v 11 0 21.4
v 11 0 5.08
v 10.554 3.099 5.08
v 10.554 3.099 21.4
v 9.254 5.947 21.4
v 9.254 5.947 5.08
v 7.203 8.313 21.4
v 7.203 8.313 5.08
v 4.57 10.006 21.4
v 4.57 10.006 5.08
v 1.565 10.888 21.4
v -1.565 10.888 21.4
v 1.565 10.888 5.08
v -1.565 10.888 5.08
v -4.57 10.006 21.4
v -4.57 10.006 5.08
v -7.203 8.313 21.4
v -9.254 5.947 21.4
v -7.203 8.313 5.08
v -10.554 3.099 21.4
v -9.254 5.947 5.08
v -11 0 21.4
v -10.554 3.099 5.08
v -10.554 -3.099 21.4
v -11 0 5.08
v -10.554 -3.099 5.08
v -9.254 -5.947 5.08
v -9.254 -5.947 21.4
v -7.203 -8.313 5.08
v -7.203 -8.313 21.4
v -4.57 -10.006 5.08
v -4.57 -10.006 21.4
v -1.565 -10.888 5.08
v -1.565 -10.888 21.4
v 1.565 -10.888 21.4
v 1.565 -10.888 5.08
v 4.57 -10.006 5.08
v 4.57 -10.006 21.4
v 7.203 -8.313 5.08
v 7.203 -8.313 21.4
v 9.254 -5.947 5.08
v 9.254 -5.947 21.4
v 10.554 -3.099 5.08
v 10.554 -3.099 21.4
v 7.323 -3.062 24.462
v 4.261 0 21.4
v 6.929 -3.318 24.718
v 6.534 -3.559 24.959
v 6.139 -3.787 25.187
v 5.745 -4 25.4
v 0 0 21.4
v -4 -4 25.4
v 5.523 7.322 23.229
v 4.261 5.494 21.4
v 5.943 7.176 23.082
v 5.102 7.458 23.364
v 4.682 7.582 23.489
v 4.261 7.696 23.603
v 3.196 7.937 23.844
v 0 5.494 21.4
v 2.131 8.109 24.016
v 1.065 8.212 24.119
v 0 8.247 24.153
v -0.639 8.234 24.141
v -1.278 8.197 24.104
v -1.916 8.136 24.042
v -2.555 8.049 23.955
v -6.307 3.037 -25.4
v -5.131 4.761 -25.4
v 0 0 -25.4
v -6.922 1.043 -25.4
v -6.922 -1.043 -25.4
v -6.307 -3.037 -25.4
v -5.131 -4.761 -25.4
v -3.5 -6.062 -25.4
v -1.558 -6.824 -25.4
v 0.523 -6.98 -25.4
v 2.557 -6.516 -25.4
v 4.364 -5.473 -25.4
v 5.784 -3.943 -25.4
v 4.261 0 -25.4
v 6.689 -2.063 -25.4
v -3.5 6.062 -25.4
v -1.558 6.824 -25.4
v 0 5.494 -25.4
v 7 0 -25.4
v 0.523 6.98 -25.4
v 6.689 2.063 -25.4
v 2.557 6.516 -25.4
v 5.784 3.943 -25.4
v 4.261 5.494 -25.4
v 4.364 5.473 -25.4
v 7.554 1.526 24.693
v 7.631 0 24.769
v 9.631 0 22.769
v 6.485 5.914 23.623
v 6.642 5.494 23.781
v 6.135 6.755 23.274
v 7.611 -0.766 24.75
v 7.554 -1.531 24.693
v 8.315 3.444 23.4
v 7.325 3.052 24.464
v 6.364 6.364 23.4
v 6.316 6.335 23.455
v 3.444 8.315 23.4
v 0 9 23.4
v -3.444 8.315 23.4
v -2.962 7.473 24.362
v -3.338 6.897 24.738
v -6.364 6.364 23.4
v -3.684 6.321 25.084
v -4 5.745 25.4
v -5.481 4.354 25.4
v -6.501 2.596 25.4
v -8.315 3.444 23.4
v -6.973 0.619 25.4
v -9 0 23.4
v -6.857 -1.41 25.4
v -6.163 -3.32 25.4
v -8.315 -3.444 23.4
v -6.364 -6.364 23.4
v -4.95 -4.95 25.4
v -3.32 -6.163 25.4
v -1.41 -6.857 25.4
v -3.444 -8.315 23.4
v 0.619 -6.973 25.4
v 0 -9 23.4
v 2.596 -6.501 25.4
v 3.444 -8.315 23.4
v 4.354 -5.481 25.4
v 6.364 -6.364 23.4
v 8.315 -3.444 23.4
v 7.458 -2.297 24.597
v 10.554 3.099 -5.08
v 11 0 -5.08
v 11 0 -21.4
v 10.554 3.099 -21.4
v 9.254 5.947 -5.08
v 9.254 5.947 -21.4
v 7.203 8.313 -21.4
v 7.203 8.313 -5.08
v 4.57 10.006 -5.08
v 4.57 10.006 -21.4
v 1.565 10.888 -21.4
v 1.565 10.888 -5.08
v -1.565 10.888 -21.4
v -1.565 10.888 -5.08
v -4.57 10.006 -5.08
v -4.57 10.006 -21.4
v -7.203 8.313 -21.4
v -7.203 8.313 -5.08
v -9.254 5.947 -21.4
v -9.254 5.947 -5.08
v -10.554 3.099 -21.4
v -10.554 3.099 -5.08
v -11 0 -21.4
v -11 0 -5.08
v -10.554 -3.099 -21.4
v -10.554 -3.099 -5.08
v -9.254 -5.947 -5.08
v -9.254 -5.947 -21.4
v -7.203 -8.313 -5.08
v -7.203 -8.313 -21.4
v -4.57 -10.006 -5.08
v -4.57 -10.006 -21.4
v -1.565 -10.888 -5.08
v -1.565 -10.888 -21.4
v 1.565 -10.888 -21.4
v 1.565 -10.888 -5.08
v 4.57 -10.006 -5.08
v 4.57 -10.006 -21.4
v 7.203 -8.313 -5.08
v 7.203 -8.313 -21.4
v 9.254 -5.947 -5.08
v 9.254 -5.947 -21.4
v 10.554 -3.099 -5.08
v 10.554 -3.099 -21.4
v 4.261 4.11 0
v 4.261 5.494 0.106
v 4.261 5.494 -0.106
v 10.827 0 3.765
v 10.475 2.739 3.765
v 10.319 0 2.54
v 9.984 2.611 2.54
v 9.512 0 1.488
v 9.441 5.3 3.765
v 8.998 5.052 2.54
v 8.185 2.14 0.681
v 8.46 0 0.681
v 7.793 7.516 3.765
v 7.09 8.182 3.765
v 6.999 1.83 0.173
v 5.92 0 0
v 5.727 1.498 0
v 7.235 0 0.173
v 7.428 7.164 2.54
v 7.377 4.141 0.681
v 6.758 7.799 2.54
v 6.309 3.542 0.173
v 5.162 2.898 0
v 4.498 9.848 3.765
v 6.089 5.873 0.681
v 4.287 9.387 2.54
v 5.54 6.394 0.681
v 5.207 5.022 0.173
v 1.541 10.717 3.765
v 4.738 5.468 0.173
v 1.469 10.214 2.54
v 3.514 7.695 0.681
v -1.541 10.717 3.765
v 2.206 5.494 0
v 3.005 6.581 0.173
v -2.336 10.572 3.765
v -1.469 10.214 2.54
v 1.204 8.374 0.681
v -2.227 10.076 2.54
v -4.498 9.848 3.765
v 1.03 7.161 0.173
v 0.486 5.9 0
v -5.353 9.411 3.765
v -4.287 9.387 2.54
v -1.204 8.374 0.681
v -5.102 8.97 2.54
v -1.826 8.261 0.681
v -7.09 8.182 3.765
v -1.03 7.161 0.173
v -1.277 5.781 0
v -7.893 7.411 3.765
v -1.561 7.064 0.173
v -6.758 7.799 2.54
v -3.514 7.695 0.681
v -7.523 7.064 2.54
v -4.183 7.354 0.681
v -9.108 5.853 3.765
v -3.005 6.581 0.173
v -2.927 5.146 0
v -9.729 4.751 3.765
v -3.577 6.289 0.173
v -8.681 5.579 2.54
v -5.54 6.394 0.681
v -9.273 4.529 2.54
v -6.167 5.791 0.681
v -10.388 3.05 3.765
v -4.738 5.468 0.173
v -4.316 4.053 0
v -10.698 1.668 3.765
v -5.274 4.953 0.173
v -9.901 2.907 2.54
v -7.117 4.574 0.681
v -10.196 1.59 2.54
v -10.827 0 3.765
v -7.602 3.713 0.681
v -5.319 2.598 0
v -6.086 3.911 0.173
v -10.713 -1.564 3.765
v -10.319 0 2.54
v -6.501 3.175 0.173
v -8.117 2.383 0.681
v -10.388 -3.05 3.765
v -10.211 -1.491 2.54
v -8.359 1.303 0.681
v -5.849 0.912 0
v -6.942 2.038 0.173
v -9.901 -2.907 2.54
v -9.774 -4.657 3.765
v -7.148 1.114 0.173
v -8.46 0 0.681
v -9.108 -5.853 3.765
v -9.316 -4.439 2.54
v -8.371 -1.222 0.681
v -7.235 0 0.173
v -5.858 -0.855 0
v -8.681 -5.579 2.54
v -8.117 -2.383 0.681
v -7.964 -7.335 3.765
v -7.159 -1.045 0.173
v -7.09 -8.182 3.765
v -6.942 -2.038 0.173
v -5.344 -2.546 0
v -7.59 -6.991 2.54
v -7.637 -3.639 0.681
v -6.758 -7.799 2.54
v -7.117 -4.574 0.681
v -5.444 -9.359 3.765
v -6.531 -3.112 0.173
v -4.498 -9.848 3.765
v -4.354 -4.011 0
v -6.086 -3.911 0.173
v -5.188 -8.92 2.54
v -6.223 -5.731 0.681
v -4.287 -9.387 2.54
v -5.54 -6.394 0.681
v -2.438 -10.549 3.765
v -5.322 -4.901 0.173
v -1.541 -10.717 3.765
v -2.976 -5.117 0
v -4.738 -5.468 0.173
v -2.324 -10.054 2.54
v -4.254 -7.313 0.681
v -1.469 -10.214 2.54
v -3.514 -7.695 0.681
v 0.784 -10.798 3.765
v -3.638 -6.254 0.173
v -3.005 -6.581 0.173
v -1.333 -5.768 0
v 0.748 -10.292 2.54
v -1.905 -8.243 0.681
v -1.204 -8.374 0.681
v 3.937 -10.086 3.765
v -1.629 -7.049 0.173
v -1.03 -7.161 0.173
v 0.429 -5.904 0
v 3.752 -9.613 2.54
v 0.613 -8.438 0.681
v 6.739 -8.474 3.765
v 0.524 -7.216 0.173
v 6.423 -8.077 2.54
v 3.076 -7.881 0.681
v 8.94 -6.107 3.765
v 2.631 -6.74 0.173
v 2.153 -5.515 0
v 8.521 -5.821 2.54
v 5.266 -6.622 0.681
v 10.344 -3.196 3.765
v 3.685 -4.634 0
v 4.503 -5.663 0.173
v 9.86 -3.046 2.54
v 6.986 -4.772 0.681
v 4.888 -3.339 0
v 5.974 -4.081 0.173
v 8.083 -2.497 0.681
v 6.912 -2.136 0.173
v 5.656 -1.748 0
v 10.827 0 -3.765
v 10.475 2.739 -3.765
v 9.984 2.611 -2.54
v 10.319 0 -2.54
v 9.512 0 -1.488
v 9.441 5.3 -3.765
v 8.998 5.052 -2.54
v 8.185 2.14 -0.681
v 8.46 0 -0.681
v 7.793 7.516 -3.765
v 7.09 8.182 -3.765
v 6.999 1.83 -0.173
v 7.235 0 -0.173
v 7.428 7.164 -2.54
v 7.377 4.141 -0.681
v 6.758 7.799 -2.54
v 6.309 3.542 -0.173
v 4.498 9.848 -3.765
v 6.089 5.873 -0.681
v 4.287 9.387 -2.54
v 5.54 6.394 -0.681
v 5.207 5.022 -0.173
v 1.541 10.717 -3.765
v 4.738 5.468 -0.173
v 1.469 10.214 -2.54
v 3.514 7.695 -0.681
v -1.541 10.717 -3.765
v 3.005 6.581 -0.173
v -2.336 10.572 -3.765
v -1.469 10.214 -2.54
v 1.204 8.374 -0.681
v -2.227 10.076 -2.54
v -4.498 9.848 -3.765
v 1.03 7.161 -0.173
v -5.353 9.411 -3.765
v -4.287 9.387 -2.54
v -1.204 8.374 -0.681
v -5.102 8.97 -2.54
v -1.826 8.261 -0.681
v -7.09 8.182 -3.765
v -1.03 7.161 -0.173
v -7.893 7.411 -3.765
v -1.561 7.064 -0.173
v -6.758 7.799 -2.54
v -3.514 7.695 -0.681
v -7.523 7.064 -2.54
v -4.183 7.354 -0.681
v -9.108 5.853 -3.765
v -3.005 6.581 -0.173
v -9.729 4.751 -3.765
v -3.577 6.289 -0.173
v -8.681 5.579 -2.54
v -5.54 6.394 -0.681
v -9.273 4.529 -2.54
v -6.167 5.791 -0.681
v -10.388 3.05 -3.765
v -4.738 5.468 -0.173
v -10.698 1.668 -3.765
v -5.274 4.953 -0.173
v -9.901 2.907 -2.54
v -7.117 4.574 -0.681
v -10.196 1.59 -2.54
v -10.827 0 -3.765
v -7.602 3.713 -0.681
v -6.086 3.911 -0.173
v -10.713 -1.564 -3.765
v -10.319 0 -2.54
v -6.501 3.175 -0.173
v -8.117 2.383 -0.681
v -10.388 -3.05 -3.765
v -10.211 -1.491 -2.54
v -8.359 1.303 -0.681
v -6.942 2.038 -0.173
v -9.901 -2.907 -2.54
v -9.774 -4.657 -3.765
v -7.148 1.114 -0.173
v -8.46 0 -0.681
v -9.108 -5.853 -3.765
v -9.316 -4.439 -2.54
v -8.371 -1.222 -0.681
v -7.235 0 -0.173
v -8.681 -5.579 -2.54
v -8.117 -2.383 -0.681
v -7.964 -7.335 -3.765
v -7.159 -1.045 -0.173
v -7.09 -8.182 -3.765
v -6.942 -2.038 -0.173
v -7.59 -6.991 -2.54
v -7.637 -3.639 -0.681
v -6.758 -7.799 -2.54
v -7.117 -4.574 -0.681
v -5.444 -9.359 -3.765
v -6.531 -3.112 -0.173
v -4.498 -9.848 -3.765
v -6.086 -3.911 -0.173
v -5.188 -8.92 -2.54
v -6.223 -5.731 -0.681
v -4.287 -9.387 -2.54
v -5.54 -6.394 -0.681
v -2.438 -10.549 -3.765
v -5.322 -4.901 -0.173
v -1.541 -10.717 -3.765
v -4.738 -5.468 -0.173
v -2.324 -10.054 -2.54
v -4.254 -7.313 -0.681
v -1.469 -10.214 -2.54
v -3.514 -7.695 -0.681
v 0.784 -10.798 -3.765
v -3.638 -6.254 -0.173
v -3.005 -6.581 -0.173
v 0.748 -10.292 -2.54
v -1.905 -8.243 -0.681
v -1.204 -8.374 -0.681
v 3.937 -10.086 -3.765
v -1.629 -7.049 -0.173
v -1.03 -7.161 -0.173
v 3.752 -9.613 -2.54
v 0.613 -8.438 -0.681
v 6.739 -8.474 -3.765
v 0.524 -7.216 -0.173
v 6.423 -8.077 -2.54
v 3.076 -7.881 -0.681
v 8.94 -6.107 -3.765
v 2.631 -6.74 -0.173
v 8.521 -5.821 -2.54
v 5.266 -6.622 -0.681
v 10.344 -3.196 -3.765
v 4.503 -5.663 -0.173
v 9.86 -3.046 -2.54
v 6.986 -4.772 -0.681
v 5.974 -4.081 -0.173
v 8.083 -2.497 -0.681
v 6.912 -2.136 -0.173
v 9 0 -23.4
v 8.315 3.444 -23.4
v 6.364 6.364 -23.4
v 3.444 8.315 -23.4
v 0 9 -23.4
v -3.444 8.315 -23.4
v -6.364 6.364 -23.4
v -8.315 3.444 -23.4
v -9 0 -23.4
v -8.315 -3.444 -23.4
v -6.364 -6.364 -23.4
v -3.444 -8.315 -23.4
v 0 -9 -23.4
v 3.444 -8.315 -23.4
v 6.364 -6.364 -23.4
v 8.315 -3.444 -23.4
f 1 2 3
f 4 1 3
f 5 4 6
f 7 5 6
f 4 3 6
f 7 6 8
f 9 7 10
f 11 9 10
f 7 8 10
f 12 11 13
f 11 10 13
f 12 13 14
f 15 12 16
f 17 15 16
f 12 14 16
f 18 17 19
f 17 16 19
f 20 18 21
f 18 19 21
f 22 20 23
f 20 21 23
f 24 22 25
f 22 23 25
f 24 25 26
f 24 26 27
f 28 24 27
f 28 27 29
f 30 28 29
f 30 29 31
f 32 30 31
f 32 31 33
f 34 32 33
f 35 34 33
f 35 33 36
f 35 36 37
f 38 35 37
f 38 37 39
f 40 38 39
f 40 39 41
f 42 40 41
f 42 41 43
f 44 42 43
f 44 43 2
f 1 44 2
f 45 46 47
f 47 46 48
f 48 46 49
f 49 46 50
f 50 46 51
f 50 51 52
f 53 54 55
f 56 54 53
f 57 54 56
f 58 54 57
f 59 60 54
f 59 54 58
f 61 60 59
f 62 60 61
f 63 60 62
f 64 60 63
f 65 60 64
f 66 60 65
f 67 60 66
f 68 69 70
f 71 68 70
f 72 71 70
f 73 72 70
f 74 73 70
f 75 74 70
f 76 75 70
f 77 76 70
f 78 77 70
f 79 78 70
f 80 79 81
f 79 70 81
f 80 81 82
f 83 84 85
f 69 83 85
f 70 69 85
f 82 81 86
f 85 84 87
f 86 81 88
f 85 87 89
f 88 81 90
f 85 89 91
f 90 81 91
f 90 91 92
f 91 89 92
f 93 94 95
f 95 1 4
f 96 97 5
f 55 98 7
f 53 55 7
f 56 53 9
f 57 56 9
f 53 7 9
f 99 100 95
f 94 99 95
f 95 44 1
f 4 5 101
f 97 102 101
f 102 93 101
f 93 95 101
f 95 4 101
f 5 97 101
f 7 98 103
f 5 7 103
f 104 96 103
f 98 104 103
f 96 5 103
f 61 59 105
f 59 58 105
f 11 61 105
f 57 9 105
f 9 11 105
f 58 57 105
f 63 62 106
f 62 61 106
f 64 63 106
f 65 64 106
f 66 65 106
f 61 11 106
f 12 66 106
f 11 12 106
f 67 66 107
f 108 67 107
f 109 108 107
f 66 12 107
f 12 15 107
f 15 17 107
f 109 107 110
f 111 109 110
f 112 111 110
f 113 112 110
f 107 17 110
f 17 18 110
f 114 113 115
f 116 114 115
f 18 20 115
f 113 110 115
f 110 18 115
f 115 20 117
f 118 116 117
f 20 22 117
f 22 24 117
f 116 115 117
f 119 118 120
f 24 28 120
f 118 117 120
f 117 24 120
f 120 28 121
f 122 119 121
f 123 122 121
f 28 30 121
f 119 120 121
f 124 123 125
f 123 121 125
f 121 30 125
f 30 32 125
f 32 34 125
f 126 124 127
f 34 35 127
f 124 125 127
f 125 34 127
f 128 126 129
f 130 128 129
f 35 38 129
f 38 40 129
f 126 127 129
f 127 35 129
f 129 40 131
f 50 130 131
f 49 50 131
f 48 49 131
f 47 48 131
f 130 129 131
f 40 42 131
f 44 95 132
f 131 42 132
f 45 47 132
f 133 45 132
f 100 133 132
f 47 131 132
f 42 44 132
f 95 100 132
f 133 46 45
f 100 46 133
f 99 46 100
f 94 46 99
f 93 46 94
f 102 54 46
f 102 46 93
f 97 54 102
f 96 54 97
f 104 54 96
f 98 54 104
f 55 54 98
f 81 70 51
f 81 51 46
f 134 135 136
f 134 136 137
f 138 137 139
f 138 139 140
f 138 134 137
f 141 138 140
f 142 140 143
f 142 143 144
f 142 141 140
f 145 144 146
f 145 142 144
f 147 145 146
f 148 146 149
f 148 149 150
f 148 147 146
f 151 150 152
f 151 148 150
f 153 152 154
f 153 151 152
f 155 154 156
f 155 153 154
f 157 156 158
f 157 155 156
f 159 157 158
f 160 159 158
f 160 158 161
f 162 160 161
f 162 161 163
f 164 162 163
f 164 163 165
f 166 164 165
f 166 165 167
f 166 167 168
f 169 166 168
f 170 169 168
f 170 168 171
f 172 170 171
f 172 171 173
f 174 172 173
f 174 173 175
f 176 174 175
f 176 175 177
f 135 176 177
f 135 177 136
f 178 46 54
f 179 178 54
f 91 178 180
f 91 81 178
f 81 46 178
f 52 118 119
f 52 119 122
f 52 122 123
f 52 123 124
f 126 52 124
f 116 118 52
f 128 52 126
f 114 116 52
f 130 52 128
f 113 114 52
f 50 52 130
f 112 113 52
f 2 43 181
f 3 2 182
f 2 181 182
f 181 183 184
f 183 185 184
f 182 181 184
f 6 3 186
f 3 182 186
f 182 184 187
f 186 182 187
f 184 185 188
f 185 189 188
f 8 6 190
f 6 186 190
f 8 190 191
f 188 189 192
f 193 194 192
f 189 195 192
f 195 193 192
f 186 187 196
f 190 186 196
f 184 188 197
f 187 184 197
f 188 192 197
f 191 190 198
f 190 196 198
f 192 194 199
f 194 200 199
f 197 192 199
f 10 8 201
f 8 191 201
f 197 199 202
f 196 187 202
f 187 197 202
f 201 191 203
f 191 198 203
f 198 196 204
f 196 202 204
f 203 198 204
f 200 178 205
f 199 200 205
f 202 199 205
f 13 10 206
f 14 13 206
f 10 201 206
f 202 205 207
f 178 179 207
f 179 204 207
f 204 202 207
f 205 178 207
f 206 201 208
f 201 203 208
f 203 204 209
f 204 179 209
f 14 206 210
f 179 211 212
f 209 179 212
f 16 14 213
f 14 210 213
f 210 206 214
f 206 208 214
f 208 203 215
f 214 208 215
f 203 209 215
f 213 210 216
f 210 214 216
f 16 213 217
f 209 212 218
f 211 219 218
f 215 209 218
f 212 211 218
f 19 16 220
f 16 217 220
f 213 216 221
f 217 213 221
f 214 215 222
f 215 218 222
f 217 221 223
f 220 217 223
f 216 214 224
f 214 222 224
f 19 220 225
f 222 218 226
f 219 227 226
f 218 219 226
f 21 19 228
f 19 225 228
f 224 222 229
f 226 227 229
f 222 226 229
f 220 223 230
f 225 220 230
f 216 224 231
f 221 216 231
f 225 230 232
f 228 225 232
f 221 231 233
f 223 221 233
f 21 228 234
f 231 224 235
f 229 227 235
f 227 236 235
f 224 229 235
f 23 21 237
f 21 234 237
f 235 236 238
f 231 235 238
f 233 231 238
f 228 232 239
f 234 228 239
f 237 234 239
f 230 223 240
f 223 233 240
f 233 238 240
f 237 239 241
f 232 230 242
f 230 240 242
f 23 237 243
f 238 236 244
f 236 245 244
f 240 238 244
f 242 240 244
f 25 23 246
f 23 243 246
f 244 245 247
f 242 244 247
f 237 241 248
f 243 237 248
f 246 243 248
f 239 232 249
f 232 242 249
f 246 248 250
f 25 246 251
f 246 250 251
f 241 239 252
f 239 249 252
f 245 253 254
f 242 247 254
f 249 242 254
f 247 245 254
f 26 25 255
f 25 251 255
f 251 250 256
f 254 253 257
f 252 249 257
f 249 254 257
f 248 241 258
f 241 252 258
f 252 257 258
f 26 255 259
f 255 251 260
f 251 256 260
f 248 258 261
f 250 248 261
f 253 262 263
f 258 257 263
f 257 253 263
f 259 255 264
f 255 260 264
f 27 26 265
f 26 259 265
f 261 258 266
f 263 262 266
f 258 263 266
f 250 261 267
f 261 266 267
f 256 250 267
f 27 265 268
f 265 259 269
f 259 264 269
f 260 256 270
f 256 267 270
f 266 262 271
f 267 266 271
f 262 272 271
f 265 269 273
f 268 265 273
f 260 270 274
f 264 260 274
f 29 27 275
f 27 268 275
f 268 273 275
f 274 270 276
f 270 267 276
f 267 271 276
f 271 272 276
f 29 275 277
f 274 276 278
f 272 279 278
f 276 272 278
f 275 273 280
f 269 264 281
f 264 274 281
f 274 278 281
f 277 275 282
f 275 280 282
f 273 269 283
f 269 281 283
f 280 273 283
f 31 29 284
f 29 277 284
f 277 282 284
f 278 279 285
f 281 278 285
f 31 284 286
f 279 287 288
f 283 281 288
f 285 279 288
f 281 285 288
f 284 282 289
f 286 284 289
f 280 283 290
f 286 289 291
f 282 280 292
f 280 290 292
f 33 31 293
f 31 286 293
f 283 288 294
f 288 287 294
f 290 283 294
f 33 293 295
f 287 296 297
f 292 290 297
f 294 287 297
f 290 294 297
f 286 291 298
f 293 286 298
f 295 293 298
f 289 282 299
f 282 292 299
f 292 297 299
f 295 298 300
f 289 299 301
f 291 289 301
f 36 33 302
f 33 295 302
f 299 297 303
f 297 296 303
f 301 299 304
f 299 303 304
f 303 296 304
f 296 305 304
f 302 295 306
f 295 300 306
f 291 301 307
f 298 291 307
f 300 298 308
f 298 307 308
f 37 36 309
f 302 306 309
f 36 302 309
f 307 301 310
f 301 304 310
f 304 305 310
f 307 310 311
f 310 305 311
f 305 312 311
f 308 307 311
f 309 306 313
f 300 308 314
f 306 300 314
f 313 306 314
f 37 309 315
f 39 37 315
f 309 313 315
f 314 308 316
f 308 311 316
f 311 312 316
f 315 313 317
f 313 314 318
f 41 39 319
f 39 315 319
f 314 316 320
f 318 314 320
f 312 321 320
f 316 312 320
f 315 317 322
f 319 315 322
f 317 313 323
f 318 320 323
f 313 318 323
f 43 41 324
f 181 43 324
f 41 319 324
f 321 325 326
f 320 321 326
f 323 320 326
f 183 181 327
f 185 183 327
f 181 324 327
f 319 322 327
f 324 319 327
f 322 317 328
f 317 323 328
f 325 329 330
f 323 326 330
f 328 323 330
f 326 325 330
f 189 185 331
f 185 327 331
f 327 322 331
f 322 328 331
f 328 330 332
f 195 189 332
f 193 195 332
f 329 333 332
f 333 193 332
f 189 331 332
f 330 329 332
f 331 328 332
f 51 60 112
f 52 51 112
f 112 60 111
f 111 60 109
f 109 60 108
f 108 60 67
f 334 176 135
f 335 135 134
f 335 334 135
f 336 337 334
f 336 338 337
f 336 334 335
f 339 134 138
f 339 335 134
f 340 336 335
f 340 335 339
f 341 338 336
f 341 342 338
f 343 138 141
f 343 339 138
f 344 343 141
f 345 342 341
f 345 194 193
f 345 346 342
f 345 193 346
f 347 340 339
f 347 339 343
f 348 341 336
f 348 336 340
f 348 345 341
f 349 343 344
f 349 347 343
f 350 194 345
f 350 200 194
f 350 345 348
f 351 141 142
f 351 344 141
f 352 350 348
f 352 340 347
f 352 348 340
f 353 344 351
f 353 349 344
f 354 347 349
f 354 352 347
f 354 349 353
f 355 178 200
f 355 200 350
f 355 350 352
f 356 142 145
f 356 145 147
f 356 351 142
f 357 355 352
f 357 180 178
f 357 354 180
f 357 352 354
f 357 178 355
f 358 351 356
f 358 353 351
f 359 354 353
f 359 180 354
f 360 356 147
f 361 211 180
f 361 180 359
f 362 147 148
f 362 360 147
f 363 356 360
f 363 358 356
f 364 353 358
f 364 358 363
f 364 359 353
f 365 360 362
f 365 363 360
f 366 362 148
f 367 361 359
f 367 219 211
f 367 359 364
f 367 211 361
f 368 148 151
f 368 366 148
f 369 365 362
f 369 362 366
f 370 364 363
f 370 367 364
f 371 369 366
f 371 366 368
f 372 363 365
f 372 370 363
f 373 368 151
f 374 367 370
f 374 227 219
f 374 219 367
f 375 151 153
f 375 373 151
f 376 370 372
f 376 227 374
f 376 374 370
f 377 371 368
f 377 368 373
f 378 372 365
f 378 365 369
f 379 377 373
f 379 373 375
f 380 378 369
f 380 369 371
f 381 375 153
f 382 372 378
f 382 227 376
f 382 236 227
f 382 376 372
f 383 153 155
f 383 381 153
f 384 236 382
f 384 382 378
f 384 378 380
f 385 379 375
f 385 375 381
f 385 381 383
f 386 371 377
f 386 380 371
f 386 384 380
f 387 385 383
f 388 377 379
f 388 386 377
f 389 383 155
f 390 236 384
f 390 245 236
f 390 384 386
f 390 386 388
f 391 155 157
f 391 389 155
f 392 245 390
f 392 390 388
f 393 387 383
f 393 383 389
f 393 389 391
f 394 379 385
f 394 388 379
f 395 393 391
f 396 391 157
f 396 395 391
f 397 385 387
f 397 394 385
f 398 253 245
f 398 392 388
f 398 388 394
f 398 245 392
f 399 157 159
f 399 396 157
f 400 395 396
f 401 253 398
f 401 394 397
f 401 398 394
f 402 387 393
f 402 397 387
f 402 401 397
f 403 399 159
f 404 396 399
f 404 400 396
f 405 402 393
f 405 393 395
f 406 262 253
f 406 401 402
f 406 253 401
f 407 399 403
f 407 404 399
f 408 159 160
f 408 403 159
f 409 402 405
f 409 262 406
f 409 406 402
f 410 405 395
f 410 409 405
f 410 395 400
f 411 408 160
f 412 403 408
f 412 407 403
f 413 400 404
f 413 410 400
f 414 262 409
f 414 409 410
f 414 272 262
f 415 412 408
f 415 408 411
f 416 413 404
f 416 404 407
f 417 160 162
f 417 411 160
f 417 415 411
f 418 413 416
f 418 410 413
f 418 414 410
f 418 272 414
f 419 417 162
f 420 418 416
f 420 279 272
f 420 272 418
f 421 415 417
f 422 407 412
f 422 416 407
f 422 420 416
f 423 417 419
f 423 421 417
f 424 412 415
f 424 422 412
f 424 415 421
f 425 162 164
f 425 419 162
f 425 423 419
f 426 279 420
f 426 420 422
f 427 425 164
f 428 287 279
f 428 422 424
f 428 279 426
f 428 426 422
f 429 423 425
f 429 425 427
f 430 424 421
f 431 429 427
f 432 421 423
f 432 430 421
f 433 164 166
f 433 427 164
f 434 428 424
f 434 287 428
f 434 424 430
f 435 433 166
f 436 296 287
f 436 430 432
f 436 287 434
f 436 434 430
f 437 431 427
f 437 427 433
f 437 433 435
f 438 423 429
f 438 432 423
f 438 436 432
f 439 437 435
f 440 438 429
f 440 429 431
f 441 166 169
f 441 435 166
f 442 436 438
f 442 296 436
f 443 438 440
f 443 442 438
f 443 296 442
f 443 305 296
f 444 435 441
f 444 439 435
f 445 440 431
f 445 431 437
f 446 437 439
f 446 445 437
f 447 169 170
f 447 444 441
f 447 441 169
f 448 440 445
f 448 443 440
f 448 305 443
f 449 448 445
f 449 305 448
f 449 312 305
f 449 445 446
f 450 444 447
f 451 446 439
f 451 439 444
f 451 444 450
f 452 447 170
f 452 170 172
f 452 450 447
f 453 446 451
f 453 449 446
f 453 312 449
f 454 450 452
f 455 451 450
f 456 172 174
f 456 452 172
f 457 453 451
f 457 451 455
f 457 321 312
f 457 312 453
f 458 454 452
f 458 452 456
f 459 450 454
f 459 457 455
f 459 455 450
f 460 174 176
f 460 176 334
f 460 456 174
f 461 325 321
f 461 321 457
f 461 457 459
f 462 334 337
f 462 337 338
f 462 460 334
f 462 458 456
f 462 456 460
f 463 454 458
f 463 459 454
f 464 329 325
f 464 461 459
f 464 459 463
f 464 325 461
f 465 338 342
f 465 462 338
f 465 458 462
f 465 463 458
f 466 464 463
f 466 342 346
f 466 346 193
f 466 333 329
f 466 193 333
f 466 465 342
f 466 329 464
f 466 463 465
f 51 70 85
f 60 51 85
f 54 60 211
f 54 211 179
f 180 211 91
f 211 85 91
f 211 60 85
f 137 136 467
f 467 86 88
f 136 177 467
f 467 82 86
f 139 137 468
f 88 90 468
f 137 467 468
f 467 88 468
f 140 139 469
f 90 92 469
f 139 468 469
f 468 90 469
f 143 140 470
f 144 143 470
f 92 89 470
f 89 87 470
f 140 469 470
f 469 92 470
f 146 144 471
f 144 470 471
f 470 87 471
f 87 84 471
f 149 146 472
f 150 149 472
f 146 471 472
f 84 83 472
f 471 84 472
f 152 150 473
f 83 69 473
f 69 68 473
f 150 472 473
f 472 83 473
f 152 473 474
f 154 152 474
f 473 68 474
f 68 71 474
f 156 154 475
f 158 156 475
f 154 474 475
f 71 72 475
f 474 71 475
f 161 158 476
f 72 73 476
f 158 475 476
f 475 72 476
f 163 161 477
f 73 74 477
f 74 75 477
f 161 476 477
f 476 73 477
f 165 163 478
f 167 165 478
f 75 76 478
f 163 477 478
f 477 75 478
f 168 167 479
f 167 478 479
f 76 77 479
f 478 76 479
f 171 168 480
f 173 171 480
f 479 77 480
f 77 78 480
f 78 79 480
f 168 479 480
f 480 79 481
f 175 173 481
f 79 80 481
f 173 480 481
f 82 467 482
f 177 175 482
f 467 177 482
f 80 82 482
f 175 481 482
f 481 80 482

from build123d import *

# Parameters (mm, degrees)
F0_R         = 11
F1_DEPTH     = 25.4
F2_W         = 4.2610359378
F2_H         = 5.4936911911
F1_FACE1_R   = 11
F3_DEPTH     = 25.401
F6_SIZE      = 4
F7_T1_DEPTH  = 5.4936911911
F7_T3_DEPTH  = 4.2610359378
F7_T11_DEPTH = 15.7804231429
F7_S13_R     = 11
F7_T14_DEPTH = 10
F7_T17_DEPTH = 14.5477678897
F7_S19_R     = 11
F7_T20_DEPTH = 9
F7_T26_DEPTH = 15.7804231429
F7_T30_DEPTH = 14.5477678897
F7_T37_DEPTH = 14.5477678897
F7_S39_R     = 11
F7_T40_DEPTH = 9
F7_T43_DEPTH = 15.7804231429
F7_S45_R     = 11
F7_T46_DEPTH = 10
F7_T52_DEPTH = 15.7804231429
F7_S54_R     = 11
F7_T55_DEPTH = 10
F7_T58_DEPTH = 14.5477678897
F7_S60_R     = 11
F7_T61_DEPTH = 9


# Not quite as in the source:
# - a fillet or chamfer that OpenCascade refuses, or shapes differently, is made with other operations: its cross-section is extruded or revolved along the edge and cut away or added


with BuildPart() as f1:
    # F0 (on Top) → F1 (new body)
    with BuildSketch(Plane.XY):
        Circle(F0_R)
    extrude(amount=F1_DEPTH)

    # F2 (on face) + F1_face1 (on face) → F3 (cut, through all)
    with BuildSketch(Plane.XY.offset(25.4)):
        with Locations((2.1305179689, 2.7468455955)):
            Rectangle(F2_W, F2_H)
    with BuildSketch(Plane(origin=(0, 0, 0), x_dir=(1, 0, 0), z_dir=(0, 0, -1))):
        Circle(F1_FACE1_R)
    extrude(amount=-F3_DEPTH, dir=(0, 0, 1), mode=Mode.SUBTRACT)

    # F4: fillet of radius 5.08 on 1 edges, made by hand

    # F4_s1 → F4_t2 (revolve, cut)
    with BuildSketch(Plane.XZ):
        with BuildLine():
            ThreePointArc((11, 5.08), (9.5121024484, 1.4878975516), (5.92, 0))
            Line((5.92, 0), (11, 0))
            Line((11, 0), (11, 5.08))
        make_face()
    revolve(axis=Axis((0, 0, 0), (0, 0, 1)), mode=Mode.SUBTRACT)

    # F5: F1 across face


with BuildPart() as f1_1:
    add(f1.part)
    add(f1.part.mirror(Plane(origin=(-0.5175939516, -0.6620763979, 0), x_dir=(1, 0, 0), z_dir=(0, 0, -1))))

    # F6
    f6_edges = [f1_1.edges().sort_by_distance(p)[0] for p in [
        (-11, 0, -25.4),
    ]]
    chamfer(f6_edges, length=F6_SIZE)

    # F7: chamfer of 4 on 5 edges, made by hand

    # F7_s2 → F7_t1 (cut)
    with BuildSketch(Plane.XZ.offset(-5.4936911911)):
        Polygon((0, 21.4), (-4, 25.4), (0, 25.4), align=None)
        Polygon((4.2610359378, 21.4), (8.2610359378, 25.4), (4.2610359378, 25.4), align=None)
    extrude(amount=F7_T1_DEPTH, mode=Mode.SUBTRACT)

    # F7_s4 → F7_t3 (cut)
    with BuildSketch(Plane.YZ):
        Polygon((0, 21.4), (-4, 25.4), (0, 25.4), align=None)
        Polygon((5.4936911911, 21.4), (9.4936911911, 25.4), (5.4936911911, 25.4), align=None)
    extrude(amount=F7_T3_DEPTH, mode=Mode.SUBTRACT)

    # F7_s5 → F7_t6 (revolve, cut)
    with BuildSketch(Plane.XZ):
        Polygon((7, 25.4), (11, 21.4), (11, 25.4), align=None)
    revolve(axis=Axis((0, 0, 25.4), (0, 0, 1)), mode=Mode.SUBTRACT)


with BuildPart() as f7_tool9:
    # F7_s10 → F7_t11 (new body)
    with BuildSketch(Plane.XZ.offset(-15.7804231429)):
        Polygon((0, 21.4), (-4, 25.4), (0, 25.4), align=None)
    extrude(amount=F7_T11_DEPTH)

    split(bisect_by=Plane.XZ.offset(-5.4936911911), keep=Keep.BOTTOM)

    # F7_s13 → F7_t14 (intersect, symmetric)
    with BuildSketch(Plane.XY.offset(23.4)):
        Circle(F7_S13_R)
    extrude(amount=F7_T14_DEPTH, both=True, mode=Mode.INTERSECT)


with BuildPart() as f7_tool15:
    # F7_s16 → F7_t17 (new body)
    with BuildSketch(Plane.YZ.offset(4.2610359378)):
        Polygon((5.4936911911, 21.4), (9.4936911911, 25.4), (5.4936911911, 25.4), align=None)
    extrude(amount=-F7_T17_DEPTH)

    split(bisect_by=Plane.YZ, keep=Keep.BOTTOM)

    # F7_s19 → F7_t20 (intersect, symmetric)
    with BuildSketch(Plane.XY.offset(23.4)):
        Circle(F7_S19_R)
    extrude(amount=F7_T20_DEPTH, both=True, mode=Mode.INTERSECT)


with BuildPart() as f7_tool9_1:
    add(f7_tool9.part)

    # F7_t21: intersect F7_tool15
    add(f7_tool15.part, mode=Mode.INTERSECT)


with BuildPart() as f1_2:
    add(f1_1.part)

    # F7_t7: cut F7_tool9
    add(f7_tool9_1.part, mode=Mode.SUBTRACT)


with BuildPart() as f7_tool24:
    # F7_s25 → F7_t26 (new body)
    with BuildSketch(Plane.XZ.offset(-5.4936911911)):
        Polygon((0, 21.4), (-4, 25.4), (0, 25.4), align=None)
    extrude(amount=F7_T26_DEPTH)

    split(bisect_by=Plane.XZ, keep=Keep.TOP)


with BuildPart() as f7_tool28:
    # F7_s29 → F7_t30 (new body)
    with BuildSketch(Plane.YZ.offset(-10.2867319519)):
        Polygon((0, 21.4), (-4, 25.4), (0, 25.4), align=None)
    extrude(amount=F7_T30_DEPTH)

    split(bisect_by=Plane.YZ, keep=Keep.BOTTOM)


with BuildPart() as f7_tool24_1:
    add(f7_tool24.part)

    # F7_t32: intersect F7_tool28
    add(f7_tool28.part, mode=Mode.INTERSECT)


with BuildPart() as f1_3:
    add(f1_2.part)

    # F7_t22: cut F7_tool24
    add(f7_tool24_1.part, mode=Mode.SUBTRACT)


with BuildPart() as f7_tool35:
    # F7_s36 → F7_t37 (new body)
    with BuildSketch(Plane.YZ):
        Polygon((0, 21.4), (-4, 25.4), (0, 25.4), align=None)
    extrude(amount=F7_T37_DEPTH)

    split(bisect_by=Plane.YZ.offset(4.2610359378), keep=Keep.TOP)

    # F7_s39 → F7_t40 (intersect, symmetric)
    with BuildSketch(Plane.XY.offset(23.4)):
        Circle(F7_S39_R)
    extrude(amount=F7_T40_DEPTH, both=True, mode=Mode.INTERSECT)


with BuildPart() as f7_tool41:
    # F7_s42 → F7_t43 (new body)
    with BuildSketch(Plane.XZ.offset(10.2867319519)):
        Polygon((4.2610359378, 21.4), (8.2610359378, 25.4), (4.2610359378, 25.4), align=None)
    extrude(amount=-F7_T43_DEPTH)

    split(bisect_by=Plane.XZ, keep=Keep.TOP)

    # F7_s45 → F7_t46 (intersect, symmetric)
    with BuildSketch(Plane.XY.offset(23.4)):
        Circle(F7_S45_R)
    extrude(amount=F7_T46_DEPTH, both=True, mode=Mode.INTERSECT)


with BuildPart() as f7_tool35_1:
    add(f7_tool35.part)

    # F7_t47: intersect F7_tool41
    add(f7_tool41.part, mode=Mode.INTERSECT)


with BuildPart() as f1_4:
    add(f1_3.part)

    # F7_t33: cut F7_tool35
    add(f7_tool35_1.part, mode=Mode.SUBTRACT)


with BuildPart() as f7_tool50:
    # F7_s51 → F7_t52 (new body)
    with BuildSketch(Plane.XZ):
        Polygon((4.2610359378, 21.4), (8.2610359378, 25.4), (4.2610359378, 25.4), align=None)
    extrude(amount=-F7_T52_DEPTH)

    split(bisect_by=Plane.XZ.offset(-5.4936911911), keep=Keep.BOTTOM)

    # F7_s54 → F7_t55 (intersect, symmetric)
    with BuildSketch(Plane.XY.offset(23.4)):
        Circle(F7_S54_R)
    extrude(amount=F7_T55_DEPTH, both=True, mode=Mode.INTERSECT)


with BuildPart() as f7_tool56:
    # F7_s57 → F7_t58 (new body)
    with BuildSketch(Plane.YZ.offset(14.5477678897)):
        Polygon((5.4936911911, 21.4), (9.4936911911, 25.4), (5.4936911911, 25.4), align=None)
    extrude(amount=-F7_T58_DEPTH)

    split(bisect_by=Plane.YZ.offset(4.2610359378), keep=Keep.TOP)

    # F7_s60 → F7_t61 (intersect, symmetric)
    with BuildSketch(Plane.XY.offset(23.4)):
        Circle(F7_S60_R)
    extrude(amount=F7_T61_DEPTH, both=True, mode=Mode.INTERSECT)


with BuildPart() as f7_tool50_1:
    add(f7_tool50.part)

    # F7_t62: intersect F7_tool56
    add(f7_tool56.part, mode=Mode.INTERSECT)


with BuildPart() as f1_5:
    add(f1_4.part)

    # F7_t48: cut F7_tool50
    add(f7_tool50_1.part, mode=Mode.SUBTRACT)


solid = f1_5.part
